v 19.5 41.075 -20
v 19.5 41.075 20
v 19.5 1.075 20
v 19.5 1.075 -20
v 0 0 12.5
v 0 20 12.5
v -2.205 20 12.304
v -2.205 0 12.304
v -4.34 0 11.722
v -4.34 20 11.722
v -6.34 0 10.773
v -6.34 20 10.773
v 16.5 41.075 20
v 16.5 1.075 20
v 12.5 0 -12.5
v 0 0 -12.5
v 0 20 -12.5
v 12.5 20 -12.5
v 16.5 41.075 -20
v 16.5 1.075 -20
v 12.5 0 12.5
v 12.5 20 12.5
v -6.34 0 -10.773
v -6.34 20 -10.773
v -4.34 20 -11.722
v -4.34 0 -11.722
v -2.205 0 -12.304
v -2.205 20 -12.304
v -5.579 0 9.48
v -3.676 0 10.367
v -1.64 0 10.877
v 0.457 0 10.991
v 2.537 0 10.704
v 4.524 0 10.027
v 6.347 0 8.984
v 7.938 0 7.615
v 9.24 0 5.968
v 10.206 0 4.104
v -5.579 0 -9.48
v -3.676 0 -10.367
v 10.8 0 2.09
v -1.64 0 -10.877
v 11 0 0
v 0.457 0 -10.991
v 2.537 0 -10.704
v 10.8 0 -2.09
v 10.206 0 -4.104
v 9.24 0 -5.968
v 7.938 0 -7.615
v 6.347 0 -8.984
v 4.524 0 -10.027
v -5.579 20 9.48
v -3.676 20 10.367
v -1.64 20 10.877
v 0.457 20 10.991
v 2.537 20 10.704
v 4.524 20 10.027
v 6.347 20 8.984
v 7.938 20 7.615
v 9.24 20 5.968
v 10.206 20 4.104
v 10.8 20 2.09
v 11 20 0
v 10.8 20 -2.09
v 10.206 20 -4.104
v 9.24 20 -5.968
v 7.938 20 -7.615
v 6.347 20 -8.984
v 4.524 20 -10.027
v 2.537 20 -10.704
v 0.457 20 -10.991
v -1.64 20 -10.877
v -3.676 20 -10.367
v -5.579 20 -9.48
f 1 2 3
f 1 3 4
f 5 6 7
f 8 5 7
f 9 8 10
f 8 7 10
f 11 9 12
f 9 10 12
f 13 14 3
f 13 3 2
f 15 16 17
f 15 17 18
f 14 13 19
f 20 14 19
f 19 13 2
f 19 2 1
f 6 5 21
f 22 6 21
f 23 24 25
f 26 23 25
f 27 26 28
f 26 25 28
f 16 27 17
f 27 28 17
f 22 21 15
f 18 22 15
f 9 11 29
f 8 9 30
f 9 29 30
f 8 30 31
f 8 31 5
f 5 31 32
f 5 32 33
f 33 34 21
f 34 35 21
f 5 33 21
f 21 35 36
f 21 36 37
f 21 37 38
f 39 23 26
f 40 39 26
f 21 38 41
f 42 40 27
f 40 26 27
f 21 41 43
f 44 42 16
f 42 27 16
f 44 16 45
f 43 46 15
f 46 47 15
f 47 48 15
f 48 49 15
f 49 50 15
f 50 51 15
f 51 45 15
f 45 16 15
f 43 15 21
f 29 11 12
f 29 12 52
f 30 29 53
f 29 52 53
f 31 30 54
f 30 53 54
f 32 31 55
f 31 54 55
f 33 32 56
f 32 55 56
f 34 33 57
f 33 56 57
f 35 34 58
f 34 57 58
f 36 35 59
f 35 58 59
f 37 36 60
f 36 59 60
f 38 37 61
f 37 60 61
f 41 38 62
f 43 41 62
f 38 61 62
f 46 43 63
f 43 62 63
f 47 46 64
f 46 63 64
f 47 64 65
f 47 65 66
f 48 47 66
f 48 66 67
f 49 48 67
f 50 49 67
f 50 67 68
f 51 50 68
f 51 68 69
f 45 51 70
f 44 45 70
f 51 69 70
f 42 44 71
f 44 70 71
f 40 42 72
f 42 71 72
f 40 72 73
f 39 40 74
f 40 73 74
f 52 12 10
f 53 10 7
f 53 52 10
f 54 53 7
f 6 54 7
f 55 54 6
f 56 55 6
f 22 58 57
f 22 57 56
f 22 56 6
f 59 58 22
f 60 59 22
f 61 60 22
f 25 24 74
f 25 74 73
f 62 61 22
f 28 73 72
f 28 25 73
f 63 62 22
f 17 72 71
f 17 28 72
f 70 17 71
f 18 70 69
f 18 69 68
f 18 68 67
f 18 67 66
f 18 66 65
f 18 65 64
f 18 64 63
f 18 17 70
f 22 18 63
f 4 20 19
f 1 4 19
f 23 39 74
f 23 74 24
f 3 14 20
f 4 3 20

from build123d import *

# Parameters (mm, degrees)
SKETCH23_W          = 25
SKETCH23_H          = 25
BOSS_EXTRUDE6_DEPTH = 20
SKETCH24_R          = 11
CUT_EXTRUDE7_DEPTH  = 21
CUT_EXTRUDE8_DEPTH  = 21
SKETCH26_W          = 40
SKETCH26_H          = 40
BOSS_EXTRUDE7_DEPTH = 3


with BuildPart() as part:
    # Sketch23 → Boss-Extrude6 (new body)
    with BuildSketch(Plane(origin=(0, 0, 0), x_dir=(1, 0, 0), z_dir=(0, 1, 0))):
        Rectangle(SKETCH23_W, SKETCH23_H)
    extrude(amount=BOSS_EXTRUDE6_DEPTH)

    # Sketch24 → Cut-Extrude7 (cut, through all)
    with BuildSketch(Plane(origin=(0, 20, 0), x_dir=(1, 0, 0), z_dir=(0, 1, 0))):
        Circle(SKETCH24_R)
    extrude(amount=-CUT_EXTRUDE7_DEPTH, mode=Mode.SUBTRACT)

    # Sketch25 → Cut-Extrude8 (cut, through all)
    with BuildSketch(Plane(origin=(0, 20, 0), x_dir=(1, 0, 0), z_dir=(0, 1, 0))):
        with BuildLine():
            Line((0, 12.5), (-12.5, 12.5))
            Line((-12.5, 12.5), (-12.5, -12.5))
            Line((-12.5, -12.5), (0, -12.5))
            ThreePointArc((0, -12.5), (-3.28547543, -12.060499625), (-6.33991603, -10.772904192))
            Line((-6.33991603, -10.772904192), (-5.579126107, -9.480155689))
            ThreePointArc((-5.579126107, -9.480155689), (-11, 0), (-5.579126107, 9.480155689))
            Line((-5.579126107, 9.480155689), (-6.33991603, 10.772904192))
            ThreePointArc((-6.33991603, 10.772904192), (-3.28547543, 12.060499625), (0, 12.5))
        make_face()
    extrude(amount=-CUT_EXTRUDE8_DEPTH, mode=Mode.SUBTRACT)


with BuildPart() as body_2:
    # Sketch26 → Boss-Extrude7 (new body)
    with BuildSketch(Plane(origin=(16.5, 0, 0), x_dir=(0, 0, -1), z_dir=(1, 0, 0))):
        with Locations((0, 21.075080982)):
            Rectangle(SKETCH26_W, SKETCH26_H)
    extrude(amount=BOSS_EXTRUDE7_DEPTH)


solid = Compound([part.part, body_2.part])
